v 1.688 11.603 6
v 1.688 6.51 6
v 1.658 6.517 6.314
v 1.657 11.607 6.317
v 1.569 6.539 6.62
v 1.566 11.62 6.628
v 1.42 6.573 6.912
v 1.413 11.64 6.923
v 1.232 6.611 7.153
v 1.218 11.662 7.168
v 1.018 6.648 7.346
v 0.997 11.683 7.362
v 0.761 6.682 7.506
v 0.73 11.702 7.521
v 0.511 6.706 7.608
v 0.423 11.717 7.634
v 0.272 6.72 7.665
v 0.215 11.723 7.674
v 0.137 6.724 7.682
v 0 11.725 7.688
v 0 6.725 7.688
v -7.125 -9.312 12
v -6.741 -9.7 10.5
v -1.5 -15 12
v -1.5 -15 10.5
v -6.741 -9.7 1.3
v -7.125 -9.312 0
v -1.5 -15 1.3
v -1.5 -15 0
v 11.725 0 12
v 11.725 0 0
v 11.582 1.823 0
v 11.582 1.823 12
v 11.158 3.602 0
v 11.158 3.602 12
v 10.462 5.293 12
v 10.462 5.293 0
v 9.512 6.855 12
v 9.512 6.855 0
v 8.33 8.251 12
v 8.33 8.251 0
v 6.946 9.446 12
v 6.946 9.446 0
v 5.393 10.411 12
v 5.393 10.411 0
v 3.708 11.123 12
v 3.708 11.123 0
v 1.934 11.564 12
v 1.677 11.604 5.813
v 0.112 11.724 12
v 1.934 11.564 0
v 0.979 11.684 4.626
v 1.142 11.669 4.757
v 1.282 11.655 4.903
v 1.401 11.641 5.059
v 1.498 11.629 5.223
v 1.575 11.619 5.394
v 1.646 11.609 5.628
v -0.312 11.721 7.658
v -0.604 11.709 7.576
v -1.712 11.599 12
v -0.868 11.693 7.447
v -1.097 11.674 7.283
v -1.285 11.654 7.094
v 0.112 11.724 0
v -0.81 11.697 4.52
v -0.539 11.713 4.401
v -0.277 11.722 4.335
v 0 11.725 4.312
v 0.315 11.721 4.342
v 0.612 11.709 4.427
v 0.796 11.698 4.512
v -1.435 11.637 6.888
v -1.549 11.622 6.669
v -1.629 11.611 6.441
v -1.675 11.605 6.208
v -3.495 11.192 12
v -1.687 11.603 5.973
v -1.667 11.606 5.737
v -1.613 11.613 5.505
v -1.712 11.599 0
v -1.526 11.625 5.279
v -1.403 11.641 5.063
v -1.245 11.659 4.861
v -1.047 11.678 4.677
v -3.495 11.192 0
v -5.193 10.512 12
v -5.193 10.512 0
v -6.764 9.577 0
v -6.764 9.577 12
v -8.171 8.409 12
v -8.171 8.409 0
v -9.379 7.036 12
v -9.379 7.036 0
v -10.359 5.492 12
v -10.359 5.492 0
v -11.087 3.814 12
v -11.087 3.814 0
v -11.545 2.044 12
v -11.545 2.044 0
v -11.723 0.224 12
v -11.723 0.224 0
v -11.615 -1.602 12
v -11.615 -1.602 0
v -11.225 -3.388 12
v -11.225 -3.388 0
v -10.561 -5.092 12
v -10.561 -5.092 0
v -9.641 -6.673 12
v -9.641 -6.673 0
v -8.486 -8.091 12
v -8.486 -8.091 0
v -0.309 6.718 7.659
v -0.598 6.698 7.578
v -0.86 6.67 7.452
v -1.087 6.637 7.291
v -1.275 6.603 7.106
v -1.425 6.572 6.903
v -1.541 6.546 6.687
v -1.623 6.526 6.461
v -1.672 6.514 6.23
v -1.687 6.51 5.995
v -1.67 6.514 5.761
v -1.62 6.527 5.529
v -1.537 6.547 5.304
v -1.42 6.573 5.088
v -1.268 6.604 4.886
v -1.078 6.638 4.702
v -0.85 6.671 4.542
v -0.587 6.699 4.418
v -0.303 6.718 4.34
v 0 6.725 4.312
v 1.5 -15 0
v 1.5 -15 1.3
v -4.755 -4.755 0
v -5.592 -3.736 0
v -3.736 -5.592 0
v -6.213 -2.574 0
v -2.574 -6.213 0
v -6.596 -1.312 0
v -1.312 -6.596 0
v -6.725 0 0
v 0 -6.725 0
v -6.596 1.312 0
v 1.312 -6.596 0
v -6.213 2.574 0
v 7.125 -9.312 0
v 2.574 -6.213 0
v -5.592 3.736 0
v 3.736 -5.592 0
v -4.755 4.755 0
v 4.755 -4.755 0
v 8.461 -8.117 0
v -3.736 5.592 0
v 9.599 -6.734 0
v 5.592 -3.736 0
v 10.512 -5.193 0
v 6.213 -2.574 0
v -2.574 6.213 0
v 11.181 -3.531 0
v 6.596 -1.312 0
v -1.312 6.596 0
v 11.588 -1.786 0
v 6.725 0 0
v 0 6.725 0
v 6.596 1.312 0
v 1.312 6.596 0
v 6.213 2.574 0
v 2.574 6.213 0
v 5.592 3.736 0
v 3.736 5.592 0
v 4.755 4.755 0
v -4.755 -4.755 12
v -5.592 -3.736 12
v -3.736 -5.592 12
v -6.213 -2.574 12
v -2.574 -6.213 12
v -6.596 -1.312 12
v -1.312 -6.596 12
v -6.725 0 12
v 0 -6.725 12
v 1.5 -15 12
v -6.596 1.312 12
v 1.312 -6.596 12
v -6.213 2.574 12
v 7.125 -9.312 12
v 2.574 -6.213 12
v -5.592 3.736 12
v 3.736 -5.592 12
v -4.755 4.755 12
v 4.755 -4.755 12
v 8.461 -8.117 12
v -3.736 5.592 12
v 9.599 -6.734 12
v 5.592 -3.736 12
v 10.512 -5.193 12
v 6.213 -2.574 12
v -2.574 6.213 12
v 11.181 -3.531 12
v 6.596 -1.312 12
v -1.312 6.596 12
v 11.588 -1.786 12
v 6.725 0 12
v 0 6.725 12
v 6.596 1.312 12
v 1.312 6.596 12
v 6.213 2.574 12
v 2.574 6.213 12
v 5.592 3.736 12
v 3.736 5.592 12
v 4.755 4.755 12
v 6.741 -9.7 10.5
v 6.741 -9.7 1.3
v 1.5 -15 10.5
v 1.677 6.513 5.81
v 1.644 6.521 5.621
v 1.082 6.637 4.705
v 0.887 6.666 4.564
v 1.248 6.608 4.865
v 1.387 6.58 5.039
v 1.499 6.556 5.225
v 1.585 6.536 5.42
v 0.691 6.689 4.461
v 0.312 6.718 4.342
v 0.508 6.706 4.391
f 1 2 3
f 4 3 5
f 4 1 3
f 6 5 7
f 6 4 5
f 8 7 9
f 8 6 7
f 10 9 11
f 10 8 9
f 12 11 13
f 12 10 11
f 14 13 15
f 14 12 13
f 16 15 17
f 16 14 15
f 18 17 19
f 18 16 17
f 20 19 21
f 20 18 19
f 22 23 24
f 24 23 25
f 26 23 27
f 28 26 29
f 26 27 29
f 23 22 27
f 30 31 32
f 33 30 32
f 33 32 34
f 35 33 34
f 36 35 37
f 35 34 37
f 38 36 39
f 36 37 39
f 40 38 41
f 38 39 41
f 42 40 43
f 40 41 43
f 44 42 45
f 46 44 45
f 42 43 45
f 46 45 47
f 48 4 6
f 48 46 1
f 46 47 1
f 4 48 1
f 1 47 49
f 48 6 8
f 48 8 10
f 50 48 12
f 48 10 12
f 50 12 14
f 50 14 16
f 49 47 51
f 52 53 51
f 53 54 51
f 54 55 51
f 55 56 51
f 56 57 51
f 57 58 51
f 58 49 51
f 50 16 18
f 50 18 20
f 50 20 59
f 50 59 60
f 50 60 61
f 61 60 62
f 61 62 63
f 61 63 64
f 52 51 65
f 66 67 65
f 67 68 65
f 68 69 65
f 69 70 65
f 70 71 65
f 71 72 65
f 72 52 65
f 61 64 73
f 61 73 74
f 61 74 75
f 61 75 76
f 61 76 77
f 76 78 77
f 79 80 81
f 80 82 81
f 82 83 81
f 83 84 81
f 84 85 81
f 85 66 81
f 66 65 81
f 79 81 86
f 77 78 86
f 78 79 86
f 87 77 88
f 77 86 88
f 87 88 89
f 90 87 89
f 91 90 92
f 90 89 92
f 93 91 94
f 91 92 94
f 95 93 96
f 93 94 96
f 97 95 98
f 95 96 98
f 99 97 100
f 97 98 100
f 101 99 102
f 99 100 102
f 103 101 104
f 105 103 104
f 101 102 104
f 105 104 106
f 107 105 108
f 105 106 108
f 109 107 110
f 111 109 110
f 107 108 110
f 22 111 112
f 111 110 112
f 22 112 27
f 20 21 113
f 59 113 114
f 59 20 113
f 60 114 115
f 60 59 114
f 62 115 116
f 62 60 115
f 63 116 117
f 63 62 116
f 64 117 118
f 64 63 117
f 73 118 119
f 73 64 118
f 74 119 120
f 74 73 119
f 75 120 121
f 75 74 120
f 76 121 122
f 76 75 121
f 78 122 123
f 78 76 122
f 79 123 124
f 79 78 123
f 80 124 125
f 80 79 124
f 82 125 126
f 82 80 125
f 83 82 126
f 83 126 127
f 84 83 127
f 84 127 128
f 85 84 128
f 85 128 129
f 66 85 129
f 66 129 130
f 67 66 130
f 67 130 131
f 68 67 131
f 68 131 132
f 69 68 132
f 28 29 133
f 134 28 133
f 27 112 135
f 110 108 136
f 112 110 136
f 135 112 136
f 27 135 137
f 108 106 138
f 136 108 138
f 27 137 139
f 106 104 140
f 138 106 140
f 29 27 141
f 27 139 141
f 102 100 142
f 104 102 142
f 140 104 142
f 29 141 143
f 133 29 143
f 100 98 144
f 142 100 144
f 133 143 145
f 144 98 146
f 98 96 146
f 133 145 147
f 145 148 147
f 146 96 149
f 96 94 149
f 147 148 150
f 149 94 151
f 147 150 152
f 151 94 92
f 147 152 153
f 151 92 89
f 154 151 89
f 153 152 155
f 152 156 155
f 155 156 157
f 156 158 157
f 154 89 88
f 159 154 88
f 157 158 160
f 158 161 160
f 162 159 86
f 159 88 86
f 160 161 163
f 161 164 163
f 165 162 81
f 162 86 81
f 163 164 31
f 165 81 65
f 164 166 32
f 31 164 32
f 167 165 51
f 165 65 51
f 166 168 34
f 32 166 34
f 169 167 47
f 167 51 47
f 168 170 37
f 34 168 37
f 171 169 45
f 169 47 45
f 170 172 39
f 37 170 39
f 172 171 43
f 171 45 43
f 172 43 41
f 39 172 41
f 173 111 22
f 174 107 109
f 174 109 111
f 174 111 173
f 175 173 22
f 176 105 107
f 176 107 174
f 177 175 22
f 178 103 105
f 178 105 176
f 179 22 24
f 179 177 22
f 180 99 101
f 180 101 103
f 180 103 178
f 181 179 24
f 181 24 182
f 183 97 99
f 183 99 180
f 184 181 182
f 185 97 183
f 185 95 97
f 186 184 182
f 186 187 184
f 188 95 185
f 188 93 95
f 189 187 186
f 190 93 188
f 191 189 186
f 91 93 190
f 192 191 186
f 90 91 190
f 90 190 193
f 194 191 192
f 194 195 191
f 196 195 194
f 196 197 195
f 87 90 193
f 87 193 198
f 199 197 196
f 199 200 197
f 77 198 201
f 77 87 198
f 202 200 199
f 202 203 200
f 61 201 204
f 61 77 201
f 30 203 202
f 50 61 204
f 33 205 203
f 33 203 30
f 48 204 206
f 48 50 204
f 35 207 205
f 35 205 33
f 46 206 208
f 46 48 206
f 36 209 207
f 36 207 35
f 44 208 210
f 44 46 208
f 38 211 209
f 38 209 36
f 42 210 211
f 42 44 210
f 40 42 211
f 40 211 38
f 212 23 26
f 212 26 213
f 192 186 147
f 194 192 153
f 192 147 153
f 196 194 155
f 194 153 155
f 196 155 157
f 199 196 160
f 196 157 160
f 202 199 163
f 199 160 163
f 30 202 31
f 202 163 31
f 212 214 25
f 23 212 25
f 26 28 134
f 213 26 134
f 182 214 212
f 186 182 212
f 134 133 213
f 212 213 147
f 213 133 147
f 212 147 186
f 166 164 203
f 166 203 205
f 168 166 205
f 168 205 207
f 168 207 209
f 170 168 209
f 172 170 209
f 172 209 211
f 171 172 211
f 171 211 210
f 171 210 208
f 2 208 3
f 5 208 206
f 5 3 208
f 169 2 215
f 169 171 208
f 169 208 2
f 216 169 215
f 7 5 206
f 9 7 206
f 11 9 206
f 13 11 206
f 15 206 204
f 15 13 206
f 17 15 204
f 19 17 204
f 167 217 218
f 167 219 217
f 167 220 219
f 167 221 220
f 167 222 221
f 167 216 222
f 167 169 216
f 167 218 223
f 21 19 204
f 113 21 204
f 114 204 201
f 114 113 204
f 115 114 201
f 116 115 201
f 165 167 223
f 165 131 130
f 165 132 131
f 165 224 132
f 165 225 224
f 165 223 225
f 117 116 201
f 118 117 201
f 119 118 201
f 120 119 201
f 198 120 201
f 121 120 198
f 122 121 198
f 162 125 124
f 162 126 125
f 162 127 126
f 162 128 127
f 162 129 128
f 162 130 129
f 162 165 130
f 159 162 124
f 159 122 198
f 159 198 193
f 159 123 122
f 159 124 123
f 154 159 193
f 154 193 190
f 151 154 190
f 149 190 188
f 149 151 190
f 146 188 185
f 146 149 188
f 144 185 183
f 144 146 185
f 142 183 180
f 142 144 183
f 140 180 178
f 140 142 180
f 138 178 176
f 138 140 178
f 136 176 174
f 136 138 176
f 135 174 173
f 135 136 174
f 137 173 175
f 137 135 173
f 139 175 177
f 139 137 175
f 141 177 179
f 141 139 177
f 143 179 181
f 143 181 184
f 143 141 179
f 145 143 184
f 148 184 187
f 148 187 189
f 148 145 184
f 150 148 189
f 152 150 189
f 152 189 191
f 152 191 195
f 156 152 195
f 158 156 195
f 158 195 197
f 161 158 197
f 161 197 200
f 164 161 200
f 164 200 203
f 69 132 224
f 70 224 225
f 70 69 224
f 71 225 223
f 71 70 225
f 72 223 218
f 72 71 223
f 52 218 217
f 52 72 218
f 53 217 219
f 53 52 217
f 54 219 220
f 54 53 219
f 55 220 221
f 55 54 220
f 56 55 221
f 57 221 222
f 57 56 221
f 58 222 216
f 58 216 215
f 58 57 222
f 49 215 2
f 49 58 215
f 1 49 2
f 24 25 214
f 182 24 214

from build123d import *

# Parameters (mm, degrees)
F0_R     = 6.725
F1_DEPTH = 12
F4_DEPTH = 10
F5_W     = 3
F5_H     = 9.2
F5_W_2   = 6.6256758422
F6_DEPTH = 5.3


with BuildPart() as f1:
    # F0 (on Top) → F1 (new body)
    with BuildSketch(Plane.XY):
        with BuildLine():
            ThreePointArc((7.1251998651, -9.3116675135), (10.5123402109, -5.1929113502), (11.725, 0))
            ThreePointArc((11.725, 0), (-5.1929113502, 10.5123402109), (-7.1251998651, -9.3116675135))
            ThreePointArc((-7.1251998651, -9.3116675135), (0, -11.725), (7.1251998651, -9.3116675135))
        make_face()
        Circle(F0_R, mode=Mode.SUBTRACT)
        with BuildLine():
            ThreePointArc((7.1251998651, -9.3116675135), (0, -11.725), (-7.1251998651, -9.3116675135))
            Line((-7.1251998651, -9.3116675135), (-1.5, -15))
            Line((-1.5, -15), (0, -15))
            Line((0, -15), (1.5, -15))
            Line((1.5, -15), (7.1251998651, -9.3116675135))
        make_face()
    extrude(amount=F1_DEPTH)

    # F3 (on offset) → F4 (cut)
    with BuildSketch(Plane.XZ.offset(-12)):
        with BuildLine():
            ThreePointArc((0, 7.6875), (-1.6875, 6), (0, 4.3125))
            Line((0, 4.3125), (0, 7.6875))
        make_face()
        with BuildLine():
            Line((0, 7.6875), (0, 4.3125))
            ThreePointArc((0, 4.3125), (1.1932426933, 4.8067573067), (1.6875, 6))
            ThreePointArc((1.6875, 6), (1.1932426933, 7.1932426933), (0, 7.6875))
        make_face()
    extrude(amount=F4_DEPTH, mode=Mode.SUBTRACT)

    # F5 (on face) → F6 (cut)
    with BuildSketch(Plane.XZ.offset(15)):
        with Locations((0, 5.9)):
            Rectangle(F5_W, F5_H)
        with Locations((-4.8128379211, 5.9)):
            Rectangle(F5_W_2, F5_H)
        with Locations((4.8128379211, 5.9)):
            Rectangle(F5_W_2, F5_H)
    extrude(amount=-F6_DEPTH, mode=Mode.SUBTRACT)


solid = f1.part
